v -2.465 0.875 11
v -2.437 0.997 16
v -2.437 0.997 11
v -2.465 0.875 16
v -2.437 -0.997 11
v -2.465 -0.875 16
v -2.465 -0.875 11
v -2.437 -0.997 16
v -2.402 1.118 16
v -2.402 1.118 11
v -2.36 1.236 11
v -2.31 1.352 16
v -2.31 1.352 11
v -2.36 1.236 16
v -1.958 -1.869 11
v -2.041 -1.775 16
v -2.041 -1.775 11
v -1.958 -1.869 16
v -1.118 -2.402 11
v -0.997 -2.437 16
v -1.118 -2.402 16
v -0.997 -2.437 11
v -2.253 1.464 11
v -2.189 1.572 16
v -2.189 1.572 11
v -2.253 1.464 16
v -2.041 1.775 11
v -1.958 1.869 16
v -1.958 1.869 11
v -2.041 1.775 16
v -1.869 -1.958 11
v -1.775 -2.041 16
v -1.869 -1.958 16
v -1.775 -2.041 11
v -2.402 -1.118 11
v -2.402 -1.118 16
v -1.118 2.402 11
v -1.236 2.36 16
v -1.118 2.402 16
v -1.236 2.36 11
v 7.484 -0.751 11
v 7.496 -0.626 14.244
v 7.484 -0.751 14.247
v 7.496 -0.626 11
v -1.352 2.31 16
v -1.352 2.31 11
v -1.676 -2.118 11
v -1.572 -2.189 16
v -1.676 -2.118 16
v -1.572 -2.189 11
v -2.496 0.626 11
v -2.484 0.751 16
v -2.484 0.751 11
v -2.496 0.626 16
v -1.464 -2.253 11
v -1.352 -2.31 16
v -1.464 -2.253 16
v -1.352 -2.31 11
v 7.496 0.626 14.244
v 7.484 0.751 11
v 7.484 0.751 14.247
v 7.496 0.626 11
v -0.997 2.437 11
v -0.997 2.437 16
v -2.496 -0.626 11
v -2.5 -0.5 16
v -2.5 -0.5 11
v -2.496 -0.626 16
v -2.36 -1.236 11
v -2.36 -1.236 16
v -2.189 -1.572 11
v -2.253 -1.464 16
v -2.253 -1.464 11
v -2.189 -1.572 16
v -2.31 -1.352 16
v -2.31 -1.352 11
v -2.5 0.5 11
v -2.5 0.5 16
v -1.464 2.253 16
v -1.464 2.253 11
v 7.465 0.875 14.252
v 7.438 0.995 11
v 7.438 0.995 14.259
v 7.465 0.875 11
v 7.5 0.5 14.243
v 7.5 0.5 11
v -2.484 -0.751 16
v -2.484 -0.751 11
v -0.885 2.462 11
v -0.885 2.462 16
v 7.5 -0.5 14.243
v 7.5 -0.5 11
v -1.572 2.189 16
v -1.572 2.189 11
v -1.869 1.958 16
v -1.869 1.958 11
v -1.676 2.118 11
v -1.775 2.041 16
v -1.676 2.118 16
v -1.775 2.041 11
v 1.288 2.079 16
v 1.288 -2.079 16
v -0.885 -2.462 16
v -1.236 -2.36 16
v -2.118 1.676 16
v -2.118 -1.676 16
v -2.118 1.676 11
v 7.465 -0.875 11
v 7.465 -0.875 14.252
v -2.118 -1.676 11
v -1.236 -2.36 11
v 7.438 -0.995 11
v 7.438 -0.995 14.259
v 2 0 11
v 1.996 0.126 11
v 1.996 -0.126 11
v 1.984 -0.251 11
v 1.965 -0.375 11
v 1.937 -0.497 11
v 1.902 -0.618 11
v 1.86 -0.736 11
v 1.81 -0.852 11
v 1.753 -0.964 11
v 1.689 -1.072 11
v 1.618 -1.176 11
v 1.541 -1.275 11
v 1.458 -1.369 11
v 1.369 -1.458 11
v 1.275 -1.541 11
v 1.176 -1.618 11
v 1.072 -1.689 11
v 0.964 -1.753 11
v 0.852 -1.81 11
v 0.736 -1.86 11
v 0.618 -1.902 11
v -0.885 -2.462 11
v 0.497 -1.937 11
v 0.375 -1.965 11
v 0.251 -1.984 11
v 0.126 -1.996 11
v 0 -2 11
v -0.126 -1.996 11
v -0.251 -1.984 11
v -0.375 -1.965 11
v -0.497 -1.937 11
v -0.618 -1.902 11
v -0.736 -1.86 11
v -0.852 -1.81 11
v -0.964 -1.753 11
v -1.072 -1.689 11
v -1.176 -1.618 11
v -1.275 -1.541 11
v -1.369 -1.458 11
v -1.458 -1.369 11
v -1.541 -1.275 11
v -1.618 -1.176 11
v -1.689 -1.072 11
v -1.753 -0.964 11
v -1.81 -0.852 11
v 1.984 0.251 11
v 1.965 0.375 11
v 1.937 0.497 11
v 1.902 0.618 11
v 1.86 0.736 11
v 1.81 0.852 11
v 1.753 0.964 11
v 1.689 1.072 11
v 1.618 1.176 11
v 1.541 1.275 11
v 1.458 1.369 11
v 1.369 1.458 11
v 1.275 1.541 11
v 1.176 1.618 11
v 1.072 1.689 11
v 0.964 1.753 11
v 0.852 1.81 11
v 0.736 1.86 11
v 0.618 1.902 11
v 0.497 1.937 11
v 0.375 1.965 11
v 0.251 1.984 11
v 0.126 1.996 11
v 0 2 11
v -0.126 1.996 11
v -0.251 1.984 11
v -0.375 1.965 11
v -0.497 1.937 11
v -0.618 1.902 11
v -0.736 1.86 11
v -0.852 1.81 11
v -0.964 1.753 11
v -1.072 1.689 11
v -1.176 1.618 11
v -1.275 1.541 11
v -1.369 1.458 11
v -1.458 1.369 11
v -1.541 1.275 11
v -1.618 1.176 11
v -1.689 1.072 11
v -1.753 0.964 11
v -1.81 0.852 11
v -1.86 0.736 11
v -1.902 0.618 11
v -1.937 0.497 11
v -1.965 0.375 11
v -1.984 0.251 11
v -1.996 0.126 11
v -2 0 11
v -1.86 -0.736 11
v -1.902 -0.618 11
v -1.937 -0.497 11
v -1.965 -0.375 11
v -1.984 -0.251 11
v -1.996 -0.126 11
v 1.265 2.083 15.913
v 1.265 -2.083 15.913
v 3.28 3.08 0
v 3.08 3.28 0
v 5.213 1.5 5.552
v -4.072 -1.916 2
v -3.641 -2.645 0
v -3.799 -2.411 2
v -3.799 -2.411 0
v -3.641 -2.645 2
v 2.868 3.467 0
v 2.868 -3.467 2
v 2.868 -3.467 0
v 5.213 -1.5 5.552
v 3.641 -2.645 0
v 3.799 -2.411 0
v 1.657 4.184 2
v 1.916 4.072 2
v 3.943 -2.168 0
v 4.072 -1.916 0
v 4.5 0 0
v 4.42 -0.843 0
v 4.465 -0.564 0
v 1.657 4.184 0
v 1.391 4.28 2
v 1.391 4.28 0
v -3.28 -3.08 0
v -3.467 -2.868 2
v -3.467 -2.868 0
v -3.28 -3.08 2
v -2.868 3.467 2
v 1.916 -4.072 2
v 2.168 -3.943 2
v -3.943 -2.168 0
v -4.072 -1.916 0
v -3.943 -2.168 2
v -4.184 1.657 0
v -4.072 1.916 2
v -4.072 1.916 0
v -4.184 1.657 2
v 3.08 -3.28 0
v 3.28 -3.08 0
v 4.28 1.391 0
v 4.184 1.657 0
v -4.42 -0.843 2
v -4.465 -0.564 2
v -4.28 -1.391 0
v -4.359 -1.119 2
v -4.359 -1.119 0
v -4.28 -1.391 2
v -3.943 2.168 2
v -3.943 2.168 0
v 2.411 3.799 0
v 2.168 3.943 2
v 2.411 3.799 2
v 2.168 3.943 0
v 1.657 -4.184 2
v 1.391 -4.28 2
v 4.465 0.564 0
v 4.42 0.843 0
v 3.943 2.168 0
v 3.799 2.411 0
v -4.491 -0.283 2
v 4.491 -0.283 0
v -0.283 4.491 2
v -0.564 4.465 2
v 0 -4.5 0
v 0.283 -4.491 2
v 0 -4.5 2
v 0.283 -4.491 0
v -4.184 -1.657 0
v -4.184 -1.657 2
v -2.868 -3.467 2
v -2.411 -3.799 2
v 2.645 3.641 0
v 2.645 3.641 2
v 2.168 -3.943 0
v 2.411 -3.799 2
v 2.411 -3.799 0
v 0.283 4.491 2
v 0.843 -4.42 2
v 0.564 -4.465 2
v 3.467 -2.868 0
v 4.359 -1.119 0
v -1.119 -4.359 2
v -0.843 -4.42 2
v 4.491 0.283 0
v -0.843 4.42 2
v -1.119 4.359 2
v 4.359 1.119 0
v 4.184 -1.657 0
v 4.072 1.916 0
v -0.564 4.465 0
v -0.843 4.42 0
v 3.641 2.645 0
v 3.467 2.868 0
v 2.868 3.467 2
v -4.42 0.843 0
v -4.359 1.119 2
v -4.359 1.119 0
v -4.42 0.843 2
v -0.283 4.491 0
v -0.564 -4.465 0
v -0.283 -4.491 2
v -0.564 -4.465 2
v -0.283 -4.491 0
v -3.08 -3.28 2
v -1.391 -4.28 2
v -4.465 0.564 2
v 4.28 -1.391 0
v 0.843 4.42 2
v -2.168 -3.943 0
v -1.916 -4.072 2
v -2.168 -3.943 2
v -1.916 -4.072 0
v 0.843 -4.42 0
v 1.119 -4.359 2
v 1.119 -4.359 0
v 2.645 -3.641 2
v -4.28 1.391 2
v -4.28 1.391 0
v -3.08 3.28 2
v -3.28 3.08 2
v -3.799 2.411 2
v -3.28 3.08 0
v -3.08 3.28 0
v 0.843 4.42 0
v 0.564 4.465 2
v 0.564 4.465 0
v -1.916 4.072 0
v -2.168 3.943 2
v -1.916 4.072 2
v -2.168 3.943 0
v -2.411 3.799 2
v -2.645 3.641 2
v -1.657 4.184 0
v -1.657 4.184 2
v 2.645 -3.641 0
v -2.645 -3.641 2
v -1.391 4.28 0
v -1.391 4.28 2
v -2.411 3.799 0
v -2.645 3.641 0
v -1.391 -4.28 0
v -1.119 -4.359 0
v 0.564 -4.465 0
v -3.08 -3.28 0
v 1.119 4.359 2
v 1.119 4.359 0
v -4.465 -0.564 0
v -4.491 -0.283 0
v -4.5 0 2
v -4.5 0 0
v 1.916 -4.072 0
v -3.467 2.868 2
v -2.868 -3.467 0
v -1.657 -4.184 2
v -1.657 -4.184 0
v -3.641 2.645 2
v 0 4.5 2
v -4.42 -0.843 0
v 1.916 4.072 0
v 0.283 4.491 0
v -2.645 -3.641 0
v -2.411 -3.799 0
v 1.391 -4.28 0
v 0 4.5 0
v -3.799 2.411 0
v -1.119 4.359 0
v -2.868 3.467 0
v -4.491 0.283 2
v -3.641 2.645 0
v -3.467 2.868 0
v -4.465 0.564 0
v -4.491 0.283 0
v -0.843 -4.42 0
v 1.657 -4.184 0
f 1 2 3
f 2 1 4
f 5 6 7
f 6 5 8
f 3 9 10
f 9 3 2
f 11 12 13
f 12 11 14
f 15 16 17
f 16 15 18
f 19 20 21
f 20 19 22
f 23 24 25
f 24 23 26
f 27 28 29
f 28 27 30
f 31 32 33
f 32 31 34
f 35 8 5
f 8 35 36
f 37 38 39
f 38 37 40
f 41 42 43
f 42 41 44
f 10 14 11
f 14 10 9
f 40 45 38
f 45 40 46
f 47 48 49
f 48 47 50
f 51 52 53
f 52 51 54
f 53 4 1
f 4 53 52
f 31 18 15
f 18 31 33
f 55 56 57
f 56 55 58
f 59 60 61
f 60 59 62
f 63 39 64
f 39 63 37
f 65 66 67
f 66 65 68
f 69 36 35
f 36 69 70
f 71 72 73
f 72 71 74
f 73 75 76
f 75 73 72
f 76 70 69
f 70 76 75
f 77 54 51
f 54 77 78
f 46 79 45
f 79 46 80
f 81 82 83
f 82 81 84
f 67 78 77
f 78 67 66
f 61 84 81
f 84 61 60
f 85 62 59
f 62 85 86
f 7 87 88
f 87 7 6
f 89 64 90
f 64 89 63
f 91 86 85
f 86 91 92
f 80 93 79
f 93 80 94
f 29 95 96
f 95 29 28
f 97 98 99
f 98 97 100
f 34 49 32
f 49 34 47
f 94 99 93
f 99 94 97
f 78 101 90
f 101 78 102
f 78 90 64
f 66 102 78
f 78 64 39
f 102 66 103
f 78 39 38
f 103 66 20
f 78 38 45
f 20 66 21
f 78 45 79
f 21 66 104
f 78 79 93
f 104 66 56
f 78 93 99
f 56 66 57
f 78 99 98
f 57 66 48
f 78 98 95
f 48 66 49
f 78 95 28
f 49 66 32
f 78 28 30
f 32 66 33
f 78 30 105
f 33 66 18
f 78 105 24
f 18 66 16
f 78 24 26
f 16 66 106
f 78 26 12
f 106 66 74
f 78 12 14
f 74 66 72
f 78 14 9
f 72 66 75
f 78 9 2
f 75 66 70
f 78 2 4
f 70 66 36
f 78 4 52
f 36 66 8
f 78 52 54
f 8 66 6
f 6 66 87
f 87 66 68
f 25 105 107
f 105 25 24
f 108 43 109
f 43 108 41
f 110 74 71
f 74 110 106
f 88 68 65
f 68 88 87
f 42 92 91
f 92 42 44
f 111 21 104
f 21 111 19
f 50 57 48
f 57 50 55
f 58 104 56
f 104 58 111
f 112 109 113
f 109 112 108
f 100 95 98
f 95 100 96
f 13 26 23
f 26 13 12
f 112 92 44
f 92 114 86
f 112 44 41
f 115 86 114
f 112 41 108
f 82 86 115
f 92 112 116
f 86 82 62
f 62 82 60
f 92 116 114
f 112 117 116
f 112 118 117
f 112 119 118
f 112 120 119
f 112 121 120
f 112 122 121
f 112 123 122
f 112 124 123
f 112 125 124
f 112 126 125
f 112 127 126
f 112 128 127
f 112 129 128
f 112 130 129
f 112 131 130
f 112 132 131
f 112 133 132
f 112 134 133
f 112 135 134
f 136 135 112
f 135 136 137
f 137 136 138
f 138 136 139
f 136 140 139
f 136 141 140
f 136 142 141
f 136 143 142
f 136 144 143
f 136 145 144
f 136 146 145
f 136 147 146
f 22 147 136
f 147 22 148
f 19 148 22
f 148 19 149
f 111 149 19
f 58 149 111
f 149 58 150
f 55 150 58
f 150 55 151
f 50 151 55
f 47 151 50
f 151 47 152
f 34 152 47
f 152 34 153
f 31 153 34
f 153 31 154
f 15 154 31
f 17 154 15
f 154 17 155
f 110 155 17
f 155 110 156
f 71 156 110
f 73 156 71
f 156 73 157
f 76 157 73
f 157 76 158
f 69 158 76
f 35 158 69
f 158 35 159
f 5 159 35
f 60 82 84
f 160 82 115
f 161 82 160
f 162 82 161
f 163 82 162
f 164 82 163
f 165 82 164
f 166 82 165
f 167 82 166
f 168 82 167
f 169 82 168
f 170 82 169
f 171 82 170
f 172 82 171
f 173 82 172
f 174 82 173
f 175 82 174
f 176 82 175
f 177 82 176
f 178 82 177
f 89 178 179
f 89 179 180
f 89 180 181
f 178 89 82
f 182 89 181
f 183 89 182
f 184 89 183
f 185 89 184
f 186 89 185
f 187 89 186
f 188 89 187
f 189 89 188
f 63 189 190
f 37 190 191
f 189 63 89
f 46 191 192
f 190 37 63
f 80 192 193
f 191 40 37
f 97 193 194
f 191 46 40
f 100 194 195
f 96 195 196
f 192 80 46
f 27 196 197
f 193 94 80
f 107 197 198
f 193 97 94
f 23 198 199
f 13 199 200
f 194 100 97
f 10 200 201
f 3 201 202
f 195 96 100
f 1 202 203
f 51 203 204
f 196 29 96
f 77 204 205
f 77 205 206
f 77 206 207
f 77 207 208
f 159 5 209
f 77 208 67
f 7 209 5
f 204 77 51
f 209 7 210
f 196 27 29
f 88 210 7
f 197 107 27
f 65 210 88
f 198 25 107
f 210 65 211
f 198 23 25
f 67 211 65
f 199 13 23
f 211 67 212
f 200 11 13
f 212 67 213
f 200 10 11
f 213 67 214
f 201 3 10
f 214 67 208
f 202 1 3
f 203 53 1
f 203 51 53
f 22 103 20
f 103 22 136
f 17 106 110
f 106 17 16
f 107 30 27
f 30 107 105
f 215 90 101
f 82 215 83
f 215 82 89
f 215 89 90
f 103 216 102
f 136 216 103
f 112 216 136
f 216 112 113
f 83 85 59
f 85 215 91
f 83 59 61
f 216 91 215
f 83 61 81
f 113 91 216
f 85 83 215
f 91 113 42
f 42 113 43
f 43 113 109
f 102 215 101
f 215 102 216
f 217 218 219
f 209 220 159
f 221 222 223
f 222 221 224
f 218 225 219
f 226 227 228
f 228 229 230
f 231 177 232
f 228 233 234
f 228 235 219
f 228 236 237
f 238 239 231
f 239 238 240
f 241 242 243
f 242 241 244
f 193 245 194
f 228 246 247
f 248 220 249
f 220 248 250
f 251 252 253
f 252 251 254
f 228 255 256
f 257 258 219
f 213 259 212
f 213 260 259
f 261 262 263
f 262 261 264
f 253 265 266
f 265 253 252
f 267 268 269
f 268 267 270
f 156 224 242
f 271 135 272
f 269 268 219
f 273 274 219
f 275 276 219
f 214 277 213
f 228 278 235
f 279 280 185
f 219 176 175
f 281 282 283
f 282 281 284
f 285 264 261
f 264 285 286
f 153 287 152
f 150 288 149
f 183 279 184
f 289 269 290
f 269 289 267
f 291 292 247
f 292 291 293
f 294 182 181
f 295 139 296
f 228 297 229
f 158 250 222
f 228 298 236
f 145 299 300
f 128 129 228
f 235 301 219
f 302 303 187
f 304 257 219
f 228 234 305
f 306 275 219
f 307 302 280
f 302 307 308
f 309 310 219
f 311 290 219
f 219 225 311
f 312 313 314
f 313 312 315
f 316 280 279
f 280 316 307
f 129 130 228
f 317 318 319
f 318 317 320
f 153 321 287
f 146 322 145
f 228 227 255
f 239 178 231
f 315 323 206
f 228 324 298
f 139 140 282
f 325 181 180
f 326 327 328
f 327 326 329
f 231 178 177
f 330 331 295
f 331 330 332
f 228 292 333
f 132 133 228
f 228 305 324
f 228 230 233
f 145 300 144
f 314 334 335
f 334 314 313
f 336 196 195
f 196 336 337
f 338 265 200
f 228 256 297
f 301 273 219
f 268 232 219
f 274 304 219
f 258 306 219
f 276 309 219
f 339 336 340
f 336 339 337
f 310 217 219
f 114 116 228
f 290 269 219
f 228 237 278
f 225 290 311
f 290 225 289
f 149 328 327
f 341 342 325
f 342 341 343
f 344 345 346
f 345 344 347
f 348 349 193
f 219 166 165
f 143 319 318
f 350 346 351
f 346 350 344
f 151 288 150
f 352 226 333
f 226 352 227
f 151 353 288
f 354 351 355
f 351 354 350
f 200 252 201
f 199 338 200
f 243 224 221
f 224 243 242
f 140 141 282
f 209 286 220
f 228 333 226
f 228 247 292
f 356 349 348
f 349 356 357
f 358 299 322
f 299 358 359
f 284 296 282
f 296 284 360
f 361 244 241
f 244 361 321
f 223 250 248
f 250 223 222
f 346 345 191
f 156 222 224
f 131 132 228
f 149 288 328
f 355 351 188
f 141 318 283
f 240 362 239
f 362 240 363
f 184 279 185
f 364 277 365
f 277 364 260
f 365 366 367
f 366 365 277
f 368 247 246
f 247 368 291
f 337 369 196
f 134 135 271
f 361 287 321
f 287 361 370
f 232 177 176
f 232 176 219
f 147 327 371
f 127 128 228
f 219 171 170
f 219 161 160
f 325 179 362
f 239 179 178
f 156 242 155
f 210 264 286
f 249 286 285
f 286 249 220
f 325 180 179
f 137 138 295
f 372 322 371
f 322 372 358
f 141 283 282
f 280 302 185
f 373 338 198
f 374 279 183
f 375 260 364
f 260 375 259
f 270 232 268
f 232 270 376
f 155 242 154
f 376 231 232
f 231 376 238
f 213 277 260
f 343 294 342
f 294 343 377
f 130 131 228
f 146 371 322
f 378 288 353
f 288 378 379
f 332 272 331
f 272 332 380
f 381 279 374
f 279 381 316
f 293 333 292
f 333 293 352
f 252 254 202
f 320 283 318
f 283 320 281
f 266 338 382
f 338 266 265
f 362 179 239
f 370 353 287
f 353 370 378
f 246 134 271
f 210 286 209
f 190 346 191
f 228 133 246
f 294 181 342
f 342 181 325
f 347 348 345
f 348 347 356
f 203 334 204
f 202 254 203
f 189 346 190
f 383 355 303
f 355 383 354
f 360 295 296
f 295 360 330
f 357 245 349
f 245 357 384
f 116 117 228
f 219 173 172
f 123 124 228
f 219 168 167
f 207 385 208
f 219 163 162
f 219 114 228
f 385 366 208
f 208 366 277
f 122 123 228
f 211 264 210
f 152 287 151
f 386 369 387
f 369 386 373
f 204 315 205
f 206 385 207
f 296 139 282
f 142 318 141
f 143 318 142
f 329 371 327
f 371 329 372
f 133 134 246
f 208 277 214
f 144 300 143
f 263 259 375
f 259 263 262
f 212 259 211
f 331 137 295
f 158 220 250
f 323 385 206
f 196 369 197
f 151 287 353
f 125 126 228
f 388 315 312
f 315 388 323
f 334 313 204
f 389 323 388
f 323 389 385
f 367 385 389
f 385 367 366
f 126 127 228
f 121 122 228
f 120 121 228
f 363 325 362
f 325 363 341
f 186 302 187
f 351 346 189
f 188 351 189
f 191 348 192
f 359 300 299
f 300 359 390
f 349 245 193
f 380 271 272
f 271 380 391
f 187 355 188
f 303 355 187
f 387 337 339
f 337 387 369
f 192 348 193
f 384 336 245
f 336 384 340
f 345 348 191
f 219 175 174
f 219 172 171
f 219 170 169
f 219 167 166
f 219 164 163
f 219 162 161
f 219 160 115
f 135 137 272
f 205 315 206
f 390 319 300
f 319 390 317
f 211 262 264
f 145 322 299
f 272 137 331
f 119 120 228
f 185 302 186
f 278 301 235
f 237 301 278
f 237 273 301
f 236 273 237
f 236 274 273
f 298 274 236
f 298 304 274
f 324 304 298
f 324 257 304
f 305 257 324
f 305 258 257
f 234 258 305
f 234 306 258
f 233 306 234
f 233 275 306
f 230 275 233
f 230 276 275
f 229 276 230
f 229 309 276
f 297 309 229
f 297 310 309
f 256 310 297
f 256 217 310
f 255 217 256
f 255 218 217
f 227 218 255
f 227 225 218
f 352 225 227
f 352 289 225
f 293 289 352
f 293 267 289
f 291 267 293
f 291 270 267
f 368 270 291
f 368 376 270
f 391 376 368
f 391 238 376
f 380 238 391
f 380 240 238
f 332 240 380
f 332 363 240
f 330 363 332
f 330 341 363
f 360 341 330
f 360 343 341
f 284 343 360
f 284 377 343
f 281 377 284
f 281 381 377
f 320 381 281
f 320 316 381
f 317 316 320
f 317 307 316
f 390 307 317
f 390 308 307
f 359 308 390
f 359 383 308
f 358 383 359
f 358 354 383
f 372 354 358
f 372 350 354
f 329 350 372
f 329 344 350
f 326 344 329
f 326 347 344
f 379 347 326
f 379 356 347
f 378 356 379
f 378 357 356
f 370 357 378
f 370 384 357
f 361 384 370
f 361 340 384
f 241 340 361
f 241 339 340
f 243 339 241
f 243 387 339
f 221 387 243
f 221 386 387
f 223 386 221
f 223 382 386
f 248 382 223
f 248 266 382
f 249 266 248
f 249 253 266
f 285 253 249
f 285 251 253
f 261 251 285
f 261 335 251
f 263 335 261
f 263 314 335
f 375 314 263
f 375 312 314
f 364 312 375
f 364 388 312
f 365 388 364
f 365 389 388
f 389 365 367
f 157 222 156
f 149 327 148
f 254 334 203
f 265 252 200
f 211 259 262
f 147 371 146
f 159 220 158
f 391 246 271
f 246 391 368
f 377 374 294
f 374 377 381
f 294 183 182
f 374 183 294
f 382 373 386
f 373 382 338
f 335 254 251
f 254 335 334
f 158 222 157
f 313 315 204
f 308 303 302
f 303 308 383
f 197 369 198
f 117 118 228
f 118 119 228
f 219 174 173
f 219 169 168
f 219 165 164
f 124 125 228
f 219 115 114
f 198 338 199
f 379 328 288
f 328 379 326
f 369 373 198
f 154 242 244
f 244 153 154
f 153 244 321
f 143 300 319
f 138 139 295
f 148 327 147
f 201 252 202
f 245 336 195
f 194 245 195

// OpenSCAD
module roundedcube(xdim ,ydim ,zdim,rdim){
hull(){
translate([rdim,rdim,0])cylinder(h=zdim,r=rdim);
translate([xdim-rdim,rdim,0])cylinder(h=zdim,r=rdim);

translate([rdim,ydim-rdim,0])cylinder(h=zdim,r=rdim);
translate([xdim-rdim,ydim-rdim,0])cylinder(h=zdim,r=rdim);
}
}


module knight_base() {
    hull(){
        cylinder(h=2, r=4.5, $fn=100);
        translate([0,0,10])cylinder(h=1, r=2, $fn = 100);
        rotate([0,20,0])translate([2,0,5])cube([2, 3, 4],true);
    }
    
}


module knight_head() {
    difference(){
        translate([-2.5,-2.5,11])roundedcube(10,5,5,2,$fn=100);
        translate([2,5,14])rotate([0,0,-10])cube([13,6,7],true);
        translate([2,-5,14])rotate([0,0,10])cube([13,6,7],true);
        translate([7,0,18])rotate([0,15,0])cube([10, 8, 7],true);
    }
}

module white_knight() {
    union() {
        color("#E0E0E0"){
        knight_base();
        knight_head();
        }
    }
}
module black_knight(){
    union() {
        color("#404040"){
        knight_base();
        knight_head();
        }
    }
}    

white_knight();
